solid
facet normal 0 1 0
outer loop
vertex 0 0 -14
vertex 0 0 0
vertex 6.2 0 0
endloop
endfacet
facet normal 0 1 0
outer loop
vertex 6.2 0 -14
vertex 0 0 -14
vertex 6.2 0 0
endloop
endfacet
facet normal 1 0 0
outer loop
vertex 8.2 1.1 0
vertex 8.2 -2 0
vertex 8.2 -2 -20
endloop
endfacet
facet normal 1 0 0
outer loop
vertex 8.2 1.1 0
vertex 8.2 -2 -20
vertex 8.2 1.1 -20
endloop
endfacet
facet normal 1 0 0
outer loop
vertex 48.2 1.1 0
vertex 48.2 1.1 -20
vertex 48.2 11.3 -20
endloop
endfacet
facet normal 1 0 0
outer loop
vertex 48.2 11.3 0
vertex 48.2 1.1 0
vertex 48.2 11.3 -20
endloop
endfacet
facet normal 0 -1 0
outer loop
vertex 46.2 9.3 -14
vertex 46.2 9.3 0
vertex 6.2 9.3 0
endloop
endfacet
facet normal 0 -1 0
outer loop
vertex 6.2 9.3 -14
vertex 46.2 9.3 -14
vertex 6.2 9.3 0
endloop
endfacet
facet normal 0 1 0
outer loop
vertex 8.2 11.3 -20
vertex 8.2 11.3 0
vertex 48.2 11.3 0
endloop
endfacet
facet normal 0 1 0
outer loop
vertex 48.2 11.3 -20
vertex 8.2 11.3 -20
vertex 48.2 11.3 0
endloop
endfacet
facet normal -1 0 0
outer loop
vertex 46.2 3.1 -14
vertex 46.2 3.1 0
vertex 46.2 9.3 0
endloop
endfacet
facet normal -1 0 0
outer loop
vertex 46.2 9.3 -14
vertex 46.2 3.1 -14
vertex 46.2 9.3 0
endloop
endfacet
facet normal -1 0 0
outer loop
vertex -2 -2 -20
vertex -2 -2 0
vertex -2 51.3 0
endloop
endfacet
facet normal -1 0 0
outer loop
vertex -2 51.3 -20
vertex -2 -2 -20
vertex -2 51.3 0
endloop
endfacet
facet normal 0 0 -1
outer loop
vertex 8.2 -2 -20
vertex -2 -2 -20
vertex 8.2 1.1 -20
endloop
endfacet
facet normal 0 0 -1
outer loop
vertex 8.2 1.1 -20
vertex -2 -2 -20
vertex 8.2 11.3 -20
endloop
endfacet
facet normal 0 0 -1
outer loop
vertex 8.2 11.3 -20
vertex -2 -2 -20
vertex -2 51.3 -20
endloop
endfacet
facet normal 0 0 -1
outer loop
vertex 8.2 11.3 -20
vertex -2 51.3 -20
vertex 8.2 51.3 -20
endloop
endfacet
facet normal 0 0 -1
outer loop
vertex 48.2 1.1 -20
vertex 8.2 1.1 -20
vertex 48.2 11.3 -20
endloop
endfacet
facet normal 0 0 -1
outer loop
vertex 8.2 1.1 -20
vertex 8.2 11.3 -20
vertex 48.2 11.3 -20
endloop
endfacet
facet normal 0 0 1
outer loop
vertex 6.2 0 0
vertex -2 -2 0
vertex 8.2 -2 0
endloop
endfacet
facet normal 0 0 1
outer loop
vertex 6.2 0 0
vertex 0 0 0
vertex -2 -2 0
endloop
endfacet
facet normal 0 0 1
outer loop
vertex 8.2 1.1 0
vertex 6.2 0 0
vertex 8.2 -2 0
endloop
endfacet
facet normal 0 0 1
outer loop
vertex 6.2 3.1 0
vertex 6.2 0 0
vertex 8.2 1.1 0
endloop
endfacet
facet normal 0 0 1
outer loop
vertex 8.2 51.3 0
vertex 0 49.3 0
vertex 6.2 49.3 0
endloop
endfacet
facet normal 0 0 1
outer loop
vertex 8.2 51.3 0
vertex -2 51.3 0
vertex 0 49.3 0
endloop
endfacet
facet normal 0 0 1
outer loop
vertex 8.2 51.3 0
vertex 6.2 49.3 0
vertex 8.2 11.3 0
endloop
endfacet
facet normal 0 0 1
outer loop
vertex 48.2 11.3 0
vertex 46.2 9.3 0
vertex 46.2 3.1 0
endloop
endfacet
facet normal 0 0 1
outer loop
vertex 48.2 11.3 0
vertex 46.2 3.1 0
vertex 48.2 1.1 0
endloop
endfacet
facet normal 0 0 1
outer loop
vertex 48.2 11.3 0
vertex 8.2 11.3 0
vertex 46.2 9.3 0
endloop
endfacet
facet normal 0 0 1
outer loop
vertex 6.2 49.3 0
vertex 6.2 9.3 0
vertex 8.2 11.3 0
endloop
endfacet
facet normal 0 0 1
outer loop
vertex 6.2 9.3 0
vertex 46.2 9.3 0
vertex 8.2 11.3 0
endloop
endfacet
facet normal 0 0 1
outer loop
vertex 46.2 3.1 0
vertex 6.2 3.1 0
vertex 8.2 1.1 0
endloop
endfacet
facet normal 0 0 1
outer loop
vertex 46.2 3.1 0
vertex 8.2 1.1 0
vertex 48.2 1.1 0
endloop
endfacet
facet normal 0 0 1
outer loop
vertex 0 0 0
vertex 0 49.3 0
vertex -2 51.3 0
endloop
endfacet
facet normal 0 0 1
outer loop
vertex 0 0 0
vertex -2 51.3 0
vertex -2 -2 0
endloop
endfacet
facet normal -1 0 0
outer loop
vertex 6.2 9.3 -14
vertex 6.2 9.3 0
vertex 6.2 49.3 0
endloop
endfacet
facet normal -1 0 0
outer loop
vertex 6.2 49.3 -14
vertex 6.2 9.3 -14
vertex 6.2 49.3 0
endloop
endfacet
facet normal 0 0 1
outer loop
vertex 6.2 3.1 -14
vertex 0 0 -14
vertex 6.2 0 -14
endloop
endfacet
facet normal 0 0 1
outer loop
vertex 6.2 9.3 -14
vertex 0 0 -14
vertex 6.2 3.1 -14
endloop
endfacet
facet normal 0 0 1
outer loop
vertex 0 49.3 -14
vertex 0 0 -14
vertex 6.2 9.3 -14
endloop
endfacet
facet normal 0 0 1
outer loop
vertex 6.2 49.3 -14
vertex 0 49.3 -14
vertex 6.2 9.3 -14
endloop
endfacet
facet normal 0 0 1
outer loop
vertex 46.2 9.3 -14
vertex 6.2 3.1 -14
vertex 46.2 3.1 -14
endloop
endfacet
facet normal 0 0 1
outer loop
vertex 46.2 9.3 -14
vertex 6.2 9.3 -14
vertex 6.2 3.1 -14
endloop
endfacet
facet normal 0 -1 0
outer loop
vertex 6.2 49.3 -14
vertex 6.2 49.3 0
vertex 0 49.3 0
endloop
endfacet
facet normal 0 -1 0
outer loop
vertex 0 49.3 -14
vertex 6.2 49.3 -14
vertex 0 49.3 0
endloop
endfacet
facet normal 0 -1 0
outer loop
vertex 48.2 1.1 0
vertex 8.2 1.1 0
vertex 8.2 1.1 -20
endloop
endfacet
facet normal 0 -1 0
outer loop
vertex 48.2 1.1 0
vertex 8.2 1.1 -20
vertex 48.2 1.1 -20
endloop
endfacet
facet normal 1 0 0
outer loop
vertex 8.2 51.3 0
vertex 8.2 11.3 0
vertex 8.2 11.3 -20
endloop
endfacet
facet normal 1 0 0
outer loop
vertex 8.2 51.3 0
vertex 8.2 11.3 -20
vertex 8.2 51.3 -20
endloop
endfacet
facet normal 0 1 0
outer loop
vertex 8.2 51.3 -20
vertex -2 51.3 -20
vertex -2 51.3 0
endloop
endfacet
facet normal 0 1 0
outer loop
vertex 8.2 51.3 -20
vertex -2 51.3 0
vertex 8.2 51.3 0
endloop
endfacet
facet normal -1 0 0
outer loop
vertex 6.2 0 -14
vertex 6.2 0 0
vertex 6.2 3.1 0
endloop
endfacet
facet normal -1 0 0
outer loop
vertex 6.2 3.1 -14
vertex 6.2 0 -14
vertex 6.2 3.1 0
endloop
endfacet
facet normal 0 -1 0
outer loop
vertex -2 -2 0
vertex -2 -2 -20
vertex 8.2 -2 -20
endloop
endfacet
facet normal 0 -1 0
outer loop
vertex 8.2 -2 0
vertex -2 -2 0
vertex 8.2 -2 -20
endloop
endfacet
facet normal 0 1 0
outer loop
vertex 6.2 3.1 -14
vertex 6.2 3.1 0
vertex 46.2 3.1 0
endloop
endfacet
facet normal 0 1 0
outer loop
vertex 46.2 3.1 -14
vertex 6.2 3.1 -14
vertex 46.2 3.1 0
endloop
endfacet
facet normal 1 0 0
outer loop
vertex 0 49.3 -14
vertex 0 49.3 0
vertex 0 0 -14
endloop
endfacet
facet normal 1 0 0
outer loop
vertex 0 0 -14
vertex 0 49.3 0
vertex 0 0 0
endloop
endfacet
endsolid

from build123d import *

# Parameters (mm, degrees)
F1_W     = 50.2
F1_H     = 53.3
F2_DEPTH = 20
F3_DEPTH = 14
F4_W     = 40
F4_H     = 40
F4_H_2   = 3.1
F5_DEPTH = 20.001


# Not quite as in the source:
# - a feature of the source that left no trace in its solid (it failed there, or was rolled back) is left out


with BuildPart() as f2:
    # F1 (on Top) → F2 (new body)
    with BuildSketch(Plane.XY):
        with Locations((23.1, 24.65)):
            Rectangle(F1_W, F1_H)
    extrude(amount=-F2_DEPTH)

    # F0 (on Top) → F3 (cut)
    with BuildSketch(Plane.XY):
        Polygon((6.2, 49.3), (0, 49.3), (0, 0), (6.2, 0), (6.2, 3.1), (46.2, 3.1), (46.2, 9.3), (6.2, 9.3), align=None)
    extrude(amount=-F3_DEPTH, mode=Mode.SUBTRACT)

    # F4 (on face) → F5 (cut, through all)
    with BuildSketch(Plane.XY):
        with Locations((28.2, 31.3)):
            Rectangle(F4_W, F4_H)
        with Locations((28.2, -0.45)):
            Rectangle(F4_W, F4_H_2)
    extrude(amount=-F5_DEPTH, mode=Mode.SUBTRACT)


solid = f2.part
